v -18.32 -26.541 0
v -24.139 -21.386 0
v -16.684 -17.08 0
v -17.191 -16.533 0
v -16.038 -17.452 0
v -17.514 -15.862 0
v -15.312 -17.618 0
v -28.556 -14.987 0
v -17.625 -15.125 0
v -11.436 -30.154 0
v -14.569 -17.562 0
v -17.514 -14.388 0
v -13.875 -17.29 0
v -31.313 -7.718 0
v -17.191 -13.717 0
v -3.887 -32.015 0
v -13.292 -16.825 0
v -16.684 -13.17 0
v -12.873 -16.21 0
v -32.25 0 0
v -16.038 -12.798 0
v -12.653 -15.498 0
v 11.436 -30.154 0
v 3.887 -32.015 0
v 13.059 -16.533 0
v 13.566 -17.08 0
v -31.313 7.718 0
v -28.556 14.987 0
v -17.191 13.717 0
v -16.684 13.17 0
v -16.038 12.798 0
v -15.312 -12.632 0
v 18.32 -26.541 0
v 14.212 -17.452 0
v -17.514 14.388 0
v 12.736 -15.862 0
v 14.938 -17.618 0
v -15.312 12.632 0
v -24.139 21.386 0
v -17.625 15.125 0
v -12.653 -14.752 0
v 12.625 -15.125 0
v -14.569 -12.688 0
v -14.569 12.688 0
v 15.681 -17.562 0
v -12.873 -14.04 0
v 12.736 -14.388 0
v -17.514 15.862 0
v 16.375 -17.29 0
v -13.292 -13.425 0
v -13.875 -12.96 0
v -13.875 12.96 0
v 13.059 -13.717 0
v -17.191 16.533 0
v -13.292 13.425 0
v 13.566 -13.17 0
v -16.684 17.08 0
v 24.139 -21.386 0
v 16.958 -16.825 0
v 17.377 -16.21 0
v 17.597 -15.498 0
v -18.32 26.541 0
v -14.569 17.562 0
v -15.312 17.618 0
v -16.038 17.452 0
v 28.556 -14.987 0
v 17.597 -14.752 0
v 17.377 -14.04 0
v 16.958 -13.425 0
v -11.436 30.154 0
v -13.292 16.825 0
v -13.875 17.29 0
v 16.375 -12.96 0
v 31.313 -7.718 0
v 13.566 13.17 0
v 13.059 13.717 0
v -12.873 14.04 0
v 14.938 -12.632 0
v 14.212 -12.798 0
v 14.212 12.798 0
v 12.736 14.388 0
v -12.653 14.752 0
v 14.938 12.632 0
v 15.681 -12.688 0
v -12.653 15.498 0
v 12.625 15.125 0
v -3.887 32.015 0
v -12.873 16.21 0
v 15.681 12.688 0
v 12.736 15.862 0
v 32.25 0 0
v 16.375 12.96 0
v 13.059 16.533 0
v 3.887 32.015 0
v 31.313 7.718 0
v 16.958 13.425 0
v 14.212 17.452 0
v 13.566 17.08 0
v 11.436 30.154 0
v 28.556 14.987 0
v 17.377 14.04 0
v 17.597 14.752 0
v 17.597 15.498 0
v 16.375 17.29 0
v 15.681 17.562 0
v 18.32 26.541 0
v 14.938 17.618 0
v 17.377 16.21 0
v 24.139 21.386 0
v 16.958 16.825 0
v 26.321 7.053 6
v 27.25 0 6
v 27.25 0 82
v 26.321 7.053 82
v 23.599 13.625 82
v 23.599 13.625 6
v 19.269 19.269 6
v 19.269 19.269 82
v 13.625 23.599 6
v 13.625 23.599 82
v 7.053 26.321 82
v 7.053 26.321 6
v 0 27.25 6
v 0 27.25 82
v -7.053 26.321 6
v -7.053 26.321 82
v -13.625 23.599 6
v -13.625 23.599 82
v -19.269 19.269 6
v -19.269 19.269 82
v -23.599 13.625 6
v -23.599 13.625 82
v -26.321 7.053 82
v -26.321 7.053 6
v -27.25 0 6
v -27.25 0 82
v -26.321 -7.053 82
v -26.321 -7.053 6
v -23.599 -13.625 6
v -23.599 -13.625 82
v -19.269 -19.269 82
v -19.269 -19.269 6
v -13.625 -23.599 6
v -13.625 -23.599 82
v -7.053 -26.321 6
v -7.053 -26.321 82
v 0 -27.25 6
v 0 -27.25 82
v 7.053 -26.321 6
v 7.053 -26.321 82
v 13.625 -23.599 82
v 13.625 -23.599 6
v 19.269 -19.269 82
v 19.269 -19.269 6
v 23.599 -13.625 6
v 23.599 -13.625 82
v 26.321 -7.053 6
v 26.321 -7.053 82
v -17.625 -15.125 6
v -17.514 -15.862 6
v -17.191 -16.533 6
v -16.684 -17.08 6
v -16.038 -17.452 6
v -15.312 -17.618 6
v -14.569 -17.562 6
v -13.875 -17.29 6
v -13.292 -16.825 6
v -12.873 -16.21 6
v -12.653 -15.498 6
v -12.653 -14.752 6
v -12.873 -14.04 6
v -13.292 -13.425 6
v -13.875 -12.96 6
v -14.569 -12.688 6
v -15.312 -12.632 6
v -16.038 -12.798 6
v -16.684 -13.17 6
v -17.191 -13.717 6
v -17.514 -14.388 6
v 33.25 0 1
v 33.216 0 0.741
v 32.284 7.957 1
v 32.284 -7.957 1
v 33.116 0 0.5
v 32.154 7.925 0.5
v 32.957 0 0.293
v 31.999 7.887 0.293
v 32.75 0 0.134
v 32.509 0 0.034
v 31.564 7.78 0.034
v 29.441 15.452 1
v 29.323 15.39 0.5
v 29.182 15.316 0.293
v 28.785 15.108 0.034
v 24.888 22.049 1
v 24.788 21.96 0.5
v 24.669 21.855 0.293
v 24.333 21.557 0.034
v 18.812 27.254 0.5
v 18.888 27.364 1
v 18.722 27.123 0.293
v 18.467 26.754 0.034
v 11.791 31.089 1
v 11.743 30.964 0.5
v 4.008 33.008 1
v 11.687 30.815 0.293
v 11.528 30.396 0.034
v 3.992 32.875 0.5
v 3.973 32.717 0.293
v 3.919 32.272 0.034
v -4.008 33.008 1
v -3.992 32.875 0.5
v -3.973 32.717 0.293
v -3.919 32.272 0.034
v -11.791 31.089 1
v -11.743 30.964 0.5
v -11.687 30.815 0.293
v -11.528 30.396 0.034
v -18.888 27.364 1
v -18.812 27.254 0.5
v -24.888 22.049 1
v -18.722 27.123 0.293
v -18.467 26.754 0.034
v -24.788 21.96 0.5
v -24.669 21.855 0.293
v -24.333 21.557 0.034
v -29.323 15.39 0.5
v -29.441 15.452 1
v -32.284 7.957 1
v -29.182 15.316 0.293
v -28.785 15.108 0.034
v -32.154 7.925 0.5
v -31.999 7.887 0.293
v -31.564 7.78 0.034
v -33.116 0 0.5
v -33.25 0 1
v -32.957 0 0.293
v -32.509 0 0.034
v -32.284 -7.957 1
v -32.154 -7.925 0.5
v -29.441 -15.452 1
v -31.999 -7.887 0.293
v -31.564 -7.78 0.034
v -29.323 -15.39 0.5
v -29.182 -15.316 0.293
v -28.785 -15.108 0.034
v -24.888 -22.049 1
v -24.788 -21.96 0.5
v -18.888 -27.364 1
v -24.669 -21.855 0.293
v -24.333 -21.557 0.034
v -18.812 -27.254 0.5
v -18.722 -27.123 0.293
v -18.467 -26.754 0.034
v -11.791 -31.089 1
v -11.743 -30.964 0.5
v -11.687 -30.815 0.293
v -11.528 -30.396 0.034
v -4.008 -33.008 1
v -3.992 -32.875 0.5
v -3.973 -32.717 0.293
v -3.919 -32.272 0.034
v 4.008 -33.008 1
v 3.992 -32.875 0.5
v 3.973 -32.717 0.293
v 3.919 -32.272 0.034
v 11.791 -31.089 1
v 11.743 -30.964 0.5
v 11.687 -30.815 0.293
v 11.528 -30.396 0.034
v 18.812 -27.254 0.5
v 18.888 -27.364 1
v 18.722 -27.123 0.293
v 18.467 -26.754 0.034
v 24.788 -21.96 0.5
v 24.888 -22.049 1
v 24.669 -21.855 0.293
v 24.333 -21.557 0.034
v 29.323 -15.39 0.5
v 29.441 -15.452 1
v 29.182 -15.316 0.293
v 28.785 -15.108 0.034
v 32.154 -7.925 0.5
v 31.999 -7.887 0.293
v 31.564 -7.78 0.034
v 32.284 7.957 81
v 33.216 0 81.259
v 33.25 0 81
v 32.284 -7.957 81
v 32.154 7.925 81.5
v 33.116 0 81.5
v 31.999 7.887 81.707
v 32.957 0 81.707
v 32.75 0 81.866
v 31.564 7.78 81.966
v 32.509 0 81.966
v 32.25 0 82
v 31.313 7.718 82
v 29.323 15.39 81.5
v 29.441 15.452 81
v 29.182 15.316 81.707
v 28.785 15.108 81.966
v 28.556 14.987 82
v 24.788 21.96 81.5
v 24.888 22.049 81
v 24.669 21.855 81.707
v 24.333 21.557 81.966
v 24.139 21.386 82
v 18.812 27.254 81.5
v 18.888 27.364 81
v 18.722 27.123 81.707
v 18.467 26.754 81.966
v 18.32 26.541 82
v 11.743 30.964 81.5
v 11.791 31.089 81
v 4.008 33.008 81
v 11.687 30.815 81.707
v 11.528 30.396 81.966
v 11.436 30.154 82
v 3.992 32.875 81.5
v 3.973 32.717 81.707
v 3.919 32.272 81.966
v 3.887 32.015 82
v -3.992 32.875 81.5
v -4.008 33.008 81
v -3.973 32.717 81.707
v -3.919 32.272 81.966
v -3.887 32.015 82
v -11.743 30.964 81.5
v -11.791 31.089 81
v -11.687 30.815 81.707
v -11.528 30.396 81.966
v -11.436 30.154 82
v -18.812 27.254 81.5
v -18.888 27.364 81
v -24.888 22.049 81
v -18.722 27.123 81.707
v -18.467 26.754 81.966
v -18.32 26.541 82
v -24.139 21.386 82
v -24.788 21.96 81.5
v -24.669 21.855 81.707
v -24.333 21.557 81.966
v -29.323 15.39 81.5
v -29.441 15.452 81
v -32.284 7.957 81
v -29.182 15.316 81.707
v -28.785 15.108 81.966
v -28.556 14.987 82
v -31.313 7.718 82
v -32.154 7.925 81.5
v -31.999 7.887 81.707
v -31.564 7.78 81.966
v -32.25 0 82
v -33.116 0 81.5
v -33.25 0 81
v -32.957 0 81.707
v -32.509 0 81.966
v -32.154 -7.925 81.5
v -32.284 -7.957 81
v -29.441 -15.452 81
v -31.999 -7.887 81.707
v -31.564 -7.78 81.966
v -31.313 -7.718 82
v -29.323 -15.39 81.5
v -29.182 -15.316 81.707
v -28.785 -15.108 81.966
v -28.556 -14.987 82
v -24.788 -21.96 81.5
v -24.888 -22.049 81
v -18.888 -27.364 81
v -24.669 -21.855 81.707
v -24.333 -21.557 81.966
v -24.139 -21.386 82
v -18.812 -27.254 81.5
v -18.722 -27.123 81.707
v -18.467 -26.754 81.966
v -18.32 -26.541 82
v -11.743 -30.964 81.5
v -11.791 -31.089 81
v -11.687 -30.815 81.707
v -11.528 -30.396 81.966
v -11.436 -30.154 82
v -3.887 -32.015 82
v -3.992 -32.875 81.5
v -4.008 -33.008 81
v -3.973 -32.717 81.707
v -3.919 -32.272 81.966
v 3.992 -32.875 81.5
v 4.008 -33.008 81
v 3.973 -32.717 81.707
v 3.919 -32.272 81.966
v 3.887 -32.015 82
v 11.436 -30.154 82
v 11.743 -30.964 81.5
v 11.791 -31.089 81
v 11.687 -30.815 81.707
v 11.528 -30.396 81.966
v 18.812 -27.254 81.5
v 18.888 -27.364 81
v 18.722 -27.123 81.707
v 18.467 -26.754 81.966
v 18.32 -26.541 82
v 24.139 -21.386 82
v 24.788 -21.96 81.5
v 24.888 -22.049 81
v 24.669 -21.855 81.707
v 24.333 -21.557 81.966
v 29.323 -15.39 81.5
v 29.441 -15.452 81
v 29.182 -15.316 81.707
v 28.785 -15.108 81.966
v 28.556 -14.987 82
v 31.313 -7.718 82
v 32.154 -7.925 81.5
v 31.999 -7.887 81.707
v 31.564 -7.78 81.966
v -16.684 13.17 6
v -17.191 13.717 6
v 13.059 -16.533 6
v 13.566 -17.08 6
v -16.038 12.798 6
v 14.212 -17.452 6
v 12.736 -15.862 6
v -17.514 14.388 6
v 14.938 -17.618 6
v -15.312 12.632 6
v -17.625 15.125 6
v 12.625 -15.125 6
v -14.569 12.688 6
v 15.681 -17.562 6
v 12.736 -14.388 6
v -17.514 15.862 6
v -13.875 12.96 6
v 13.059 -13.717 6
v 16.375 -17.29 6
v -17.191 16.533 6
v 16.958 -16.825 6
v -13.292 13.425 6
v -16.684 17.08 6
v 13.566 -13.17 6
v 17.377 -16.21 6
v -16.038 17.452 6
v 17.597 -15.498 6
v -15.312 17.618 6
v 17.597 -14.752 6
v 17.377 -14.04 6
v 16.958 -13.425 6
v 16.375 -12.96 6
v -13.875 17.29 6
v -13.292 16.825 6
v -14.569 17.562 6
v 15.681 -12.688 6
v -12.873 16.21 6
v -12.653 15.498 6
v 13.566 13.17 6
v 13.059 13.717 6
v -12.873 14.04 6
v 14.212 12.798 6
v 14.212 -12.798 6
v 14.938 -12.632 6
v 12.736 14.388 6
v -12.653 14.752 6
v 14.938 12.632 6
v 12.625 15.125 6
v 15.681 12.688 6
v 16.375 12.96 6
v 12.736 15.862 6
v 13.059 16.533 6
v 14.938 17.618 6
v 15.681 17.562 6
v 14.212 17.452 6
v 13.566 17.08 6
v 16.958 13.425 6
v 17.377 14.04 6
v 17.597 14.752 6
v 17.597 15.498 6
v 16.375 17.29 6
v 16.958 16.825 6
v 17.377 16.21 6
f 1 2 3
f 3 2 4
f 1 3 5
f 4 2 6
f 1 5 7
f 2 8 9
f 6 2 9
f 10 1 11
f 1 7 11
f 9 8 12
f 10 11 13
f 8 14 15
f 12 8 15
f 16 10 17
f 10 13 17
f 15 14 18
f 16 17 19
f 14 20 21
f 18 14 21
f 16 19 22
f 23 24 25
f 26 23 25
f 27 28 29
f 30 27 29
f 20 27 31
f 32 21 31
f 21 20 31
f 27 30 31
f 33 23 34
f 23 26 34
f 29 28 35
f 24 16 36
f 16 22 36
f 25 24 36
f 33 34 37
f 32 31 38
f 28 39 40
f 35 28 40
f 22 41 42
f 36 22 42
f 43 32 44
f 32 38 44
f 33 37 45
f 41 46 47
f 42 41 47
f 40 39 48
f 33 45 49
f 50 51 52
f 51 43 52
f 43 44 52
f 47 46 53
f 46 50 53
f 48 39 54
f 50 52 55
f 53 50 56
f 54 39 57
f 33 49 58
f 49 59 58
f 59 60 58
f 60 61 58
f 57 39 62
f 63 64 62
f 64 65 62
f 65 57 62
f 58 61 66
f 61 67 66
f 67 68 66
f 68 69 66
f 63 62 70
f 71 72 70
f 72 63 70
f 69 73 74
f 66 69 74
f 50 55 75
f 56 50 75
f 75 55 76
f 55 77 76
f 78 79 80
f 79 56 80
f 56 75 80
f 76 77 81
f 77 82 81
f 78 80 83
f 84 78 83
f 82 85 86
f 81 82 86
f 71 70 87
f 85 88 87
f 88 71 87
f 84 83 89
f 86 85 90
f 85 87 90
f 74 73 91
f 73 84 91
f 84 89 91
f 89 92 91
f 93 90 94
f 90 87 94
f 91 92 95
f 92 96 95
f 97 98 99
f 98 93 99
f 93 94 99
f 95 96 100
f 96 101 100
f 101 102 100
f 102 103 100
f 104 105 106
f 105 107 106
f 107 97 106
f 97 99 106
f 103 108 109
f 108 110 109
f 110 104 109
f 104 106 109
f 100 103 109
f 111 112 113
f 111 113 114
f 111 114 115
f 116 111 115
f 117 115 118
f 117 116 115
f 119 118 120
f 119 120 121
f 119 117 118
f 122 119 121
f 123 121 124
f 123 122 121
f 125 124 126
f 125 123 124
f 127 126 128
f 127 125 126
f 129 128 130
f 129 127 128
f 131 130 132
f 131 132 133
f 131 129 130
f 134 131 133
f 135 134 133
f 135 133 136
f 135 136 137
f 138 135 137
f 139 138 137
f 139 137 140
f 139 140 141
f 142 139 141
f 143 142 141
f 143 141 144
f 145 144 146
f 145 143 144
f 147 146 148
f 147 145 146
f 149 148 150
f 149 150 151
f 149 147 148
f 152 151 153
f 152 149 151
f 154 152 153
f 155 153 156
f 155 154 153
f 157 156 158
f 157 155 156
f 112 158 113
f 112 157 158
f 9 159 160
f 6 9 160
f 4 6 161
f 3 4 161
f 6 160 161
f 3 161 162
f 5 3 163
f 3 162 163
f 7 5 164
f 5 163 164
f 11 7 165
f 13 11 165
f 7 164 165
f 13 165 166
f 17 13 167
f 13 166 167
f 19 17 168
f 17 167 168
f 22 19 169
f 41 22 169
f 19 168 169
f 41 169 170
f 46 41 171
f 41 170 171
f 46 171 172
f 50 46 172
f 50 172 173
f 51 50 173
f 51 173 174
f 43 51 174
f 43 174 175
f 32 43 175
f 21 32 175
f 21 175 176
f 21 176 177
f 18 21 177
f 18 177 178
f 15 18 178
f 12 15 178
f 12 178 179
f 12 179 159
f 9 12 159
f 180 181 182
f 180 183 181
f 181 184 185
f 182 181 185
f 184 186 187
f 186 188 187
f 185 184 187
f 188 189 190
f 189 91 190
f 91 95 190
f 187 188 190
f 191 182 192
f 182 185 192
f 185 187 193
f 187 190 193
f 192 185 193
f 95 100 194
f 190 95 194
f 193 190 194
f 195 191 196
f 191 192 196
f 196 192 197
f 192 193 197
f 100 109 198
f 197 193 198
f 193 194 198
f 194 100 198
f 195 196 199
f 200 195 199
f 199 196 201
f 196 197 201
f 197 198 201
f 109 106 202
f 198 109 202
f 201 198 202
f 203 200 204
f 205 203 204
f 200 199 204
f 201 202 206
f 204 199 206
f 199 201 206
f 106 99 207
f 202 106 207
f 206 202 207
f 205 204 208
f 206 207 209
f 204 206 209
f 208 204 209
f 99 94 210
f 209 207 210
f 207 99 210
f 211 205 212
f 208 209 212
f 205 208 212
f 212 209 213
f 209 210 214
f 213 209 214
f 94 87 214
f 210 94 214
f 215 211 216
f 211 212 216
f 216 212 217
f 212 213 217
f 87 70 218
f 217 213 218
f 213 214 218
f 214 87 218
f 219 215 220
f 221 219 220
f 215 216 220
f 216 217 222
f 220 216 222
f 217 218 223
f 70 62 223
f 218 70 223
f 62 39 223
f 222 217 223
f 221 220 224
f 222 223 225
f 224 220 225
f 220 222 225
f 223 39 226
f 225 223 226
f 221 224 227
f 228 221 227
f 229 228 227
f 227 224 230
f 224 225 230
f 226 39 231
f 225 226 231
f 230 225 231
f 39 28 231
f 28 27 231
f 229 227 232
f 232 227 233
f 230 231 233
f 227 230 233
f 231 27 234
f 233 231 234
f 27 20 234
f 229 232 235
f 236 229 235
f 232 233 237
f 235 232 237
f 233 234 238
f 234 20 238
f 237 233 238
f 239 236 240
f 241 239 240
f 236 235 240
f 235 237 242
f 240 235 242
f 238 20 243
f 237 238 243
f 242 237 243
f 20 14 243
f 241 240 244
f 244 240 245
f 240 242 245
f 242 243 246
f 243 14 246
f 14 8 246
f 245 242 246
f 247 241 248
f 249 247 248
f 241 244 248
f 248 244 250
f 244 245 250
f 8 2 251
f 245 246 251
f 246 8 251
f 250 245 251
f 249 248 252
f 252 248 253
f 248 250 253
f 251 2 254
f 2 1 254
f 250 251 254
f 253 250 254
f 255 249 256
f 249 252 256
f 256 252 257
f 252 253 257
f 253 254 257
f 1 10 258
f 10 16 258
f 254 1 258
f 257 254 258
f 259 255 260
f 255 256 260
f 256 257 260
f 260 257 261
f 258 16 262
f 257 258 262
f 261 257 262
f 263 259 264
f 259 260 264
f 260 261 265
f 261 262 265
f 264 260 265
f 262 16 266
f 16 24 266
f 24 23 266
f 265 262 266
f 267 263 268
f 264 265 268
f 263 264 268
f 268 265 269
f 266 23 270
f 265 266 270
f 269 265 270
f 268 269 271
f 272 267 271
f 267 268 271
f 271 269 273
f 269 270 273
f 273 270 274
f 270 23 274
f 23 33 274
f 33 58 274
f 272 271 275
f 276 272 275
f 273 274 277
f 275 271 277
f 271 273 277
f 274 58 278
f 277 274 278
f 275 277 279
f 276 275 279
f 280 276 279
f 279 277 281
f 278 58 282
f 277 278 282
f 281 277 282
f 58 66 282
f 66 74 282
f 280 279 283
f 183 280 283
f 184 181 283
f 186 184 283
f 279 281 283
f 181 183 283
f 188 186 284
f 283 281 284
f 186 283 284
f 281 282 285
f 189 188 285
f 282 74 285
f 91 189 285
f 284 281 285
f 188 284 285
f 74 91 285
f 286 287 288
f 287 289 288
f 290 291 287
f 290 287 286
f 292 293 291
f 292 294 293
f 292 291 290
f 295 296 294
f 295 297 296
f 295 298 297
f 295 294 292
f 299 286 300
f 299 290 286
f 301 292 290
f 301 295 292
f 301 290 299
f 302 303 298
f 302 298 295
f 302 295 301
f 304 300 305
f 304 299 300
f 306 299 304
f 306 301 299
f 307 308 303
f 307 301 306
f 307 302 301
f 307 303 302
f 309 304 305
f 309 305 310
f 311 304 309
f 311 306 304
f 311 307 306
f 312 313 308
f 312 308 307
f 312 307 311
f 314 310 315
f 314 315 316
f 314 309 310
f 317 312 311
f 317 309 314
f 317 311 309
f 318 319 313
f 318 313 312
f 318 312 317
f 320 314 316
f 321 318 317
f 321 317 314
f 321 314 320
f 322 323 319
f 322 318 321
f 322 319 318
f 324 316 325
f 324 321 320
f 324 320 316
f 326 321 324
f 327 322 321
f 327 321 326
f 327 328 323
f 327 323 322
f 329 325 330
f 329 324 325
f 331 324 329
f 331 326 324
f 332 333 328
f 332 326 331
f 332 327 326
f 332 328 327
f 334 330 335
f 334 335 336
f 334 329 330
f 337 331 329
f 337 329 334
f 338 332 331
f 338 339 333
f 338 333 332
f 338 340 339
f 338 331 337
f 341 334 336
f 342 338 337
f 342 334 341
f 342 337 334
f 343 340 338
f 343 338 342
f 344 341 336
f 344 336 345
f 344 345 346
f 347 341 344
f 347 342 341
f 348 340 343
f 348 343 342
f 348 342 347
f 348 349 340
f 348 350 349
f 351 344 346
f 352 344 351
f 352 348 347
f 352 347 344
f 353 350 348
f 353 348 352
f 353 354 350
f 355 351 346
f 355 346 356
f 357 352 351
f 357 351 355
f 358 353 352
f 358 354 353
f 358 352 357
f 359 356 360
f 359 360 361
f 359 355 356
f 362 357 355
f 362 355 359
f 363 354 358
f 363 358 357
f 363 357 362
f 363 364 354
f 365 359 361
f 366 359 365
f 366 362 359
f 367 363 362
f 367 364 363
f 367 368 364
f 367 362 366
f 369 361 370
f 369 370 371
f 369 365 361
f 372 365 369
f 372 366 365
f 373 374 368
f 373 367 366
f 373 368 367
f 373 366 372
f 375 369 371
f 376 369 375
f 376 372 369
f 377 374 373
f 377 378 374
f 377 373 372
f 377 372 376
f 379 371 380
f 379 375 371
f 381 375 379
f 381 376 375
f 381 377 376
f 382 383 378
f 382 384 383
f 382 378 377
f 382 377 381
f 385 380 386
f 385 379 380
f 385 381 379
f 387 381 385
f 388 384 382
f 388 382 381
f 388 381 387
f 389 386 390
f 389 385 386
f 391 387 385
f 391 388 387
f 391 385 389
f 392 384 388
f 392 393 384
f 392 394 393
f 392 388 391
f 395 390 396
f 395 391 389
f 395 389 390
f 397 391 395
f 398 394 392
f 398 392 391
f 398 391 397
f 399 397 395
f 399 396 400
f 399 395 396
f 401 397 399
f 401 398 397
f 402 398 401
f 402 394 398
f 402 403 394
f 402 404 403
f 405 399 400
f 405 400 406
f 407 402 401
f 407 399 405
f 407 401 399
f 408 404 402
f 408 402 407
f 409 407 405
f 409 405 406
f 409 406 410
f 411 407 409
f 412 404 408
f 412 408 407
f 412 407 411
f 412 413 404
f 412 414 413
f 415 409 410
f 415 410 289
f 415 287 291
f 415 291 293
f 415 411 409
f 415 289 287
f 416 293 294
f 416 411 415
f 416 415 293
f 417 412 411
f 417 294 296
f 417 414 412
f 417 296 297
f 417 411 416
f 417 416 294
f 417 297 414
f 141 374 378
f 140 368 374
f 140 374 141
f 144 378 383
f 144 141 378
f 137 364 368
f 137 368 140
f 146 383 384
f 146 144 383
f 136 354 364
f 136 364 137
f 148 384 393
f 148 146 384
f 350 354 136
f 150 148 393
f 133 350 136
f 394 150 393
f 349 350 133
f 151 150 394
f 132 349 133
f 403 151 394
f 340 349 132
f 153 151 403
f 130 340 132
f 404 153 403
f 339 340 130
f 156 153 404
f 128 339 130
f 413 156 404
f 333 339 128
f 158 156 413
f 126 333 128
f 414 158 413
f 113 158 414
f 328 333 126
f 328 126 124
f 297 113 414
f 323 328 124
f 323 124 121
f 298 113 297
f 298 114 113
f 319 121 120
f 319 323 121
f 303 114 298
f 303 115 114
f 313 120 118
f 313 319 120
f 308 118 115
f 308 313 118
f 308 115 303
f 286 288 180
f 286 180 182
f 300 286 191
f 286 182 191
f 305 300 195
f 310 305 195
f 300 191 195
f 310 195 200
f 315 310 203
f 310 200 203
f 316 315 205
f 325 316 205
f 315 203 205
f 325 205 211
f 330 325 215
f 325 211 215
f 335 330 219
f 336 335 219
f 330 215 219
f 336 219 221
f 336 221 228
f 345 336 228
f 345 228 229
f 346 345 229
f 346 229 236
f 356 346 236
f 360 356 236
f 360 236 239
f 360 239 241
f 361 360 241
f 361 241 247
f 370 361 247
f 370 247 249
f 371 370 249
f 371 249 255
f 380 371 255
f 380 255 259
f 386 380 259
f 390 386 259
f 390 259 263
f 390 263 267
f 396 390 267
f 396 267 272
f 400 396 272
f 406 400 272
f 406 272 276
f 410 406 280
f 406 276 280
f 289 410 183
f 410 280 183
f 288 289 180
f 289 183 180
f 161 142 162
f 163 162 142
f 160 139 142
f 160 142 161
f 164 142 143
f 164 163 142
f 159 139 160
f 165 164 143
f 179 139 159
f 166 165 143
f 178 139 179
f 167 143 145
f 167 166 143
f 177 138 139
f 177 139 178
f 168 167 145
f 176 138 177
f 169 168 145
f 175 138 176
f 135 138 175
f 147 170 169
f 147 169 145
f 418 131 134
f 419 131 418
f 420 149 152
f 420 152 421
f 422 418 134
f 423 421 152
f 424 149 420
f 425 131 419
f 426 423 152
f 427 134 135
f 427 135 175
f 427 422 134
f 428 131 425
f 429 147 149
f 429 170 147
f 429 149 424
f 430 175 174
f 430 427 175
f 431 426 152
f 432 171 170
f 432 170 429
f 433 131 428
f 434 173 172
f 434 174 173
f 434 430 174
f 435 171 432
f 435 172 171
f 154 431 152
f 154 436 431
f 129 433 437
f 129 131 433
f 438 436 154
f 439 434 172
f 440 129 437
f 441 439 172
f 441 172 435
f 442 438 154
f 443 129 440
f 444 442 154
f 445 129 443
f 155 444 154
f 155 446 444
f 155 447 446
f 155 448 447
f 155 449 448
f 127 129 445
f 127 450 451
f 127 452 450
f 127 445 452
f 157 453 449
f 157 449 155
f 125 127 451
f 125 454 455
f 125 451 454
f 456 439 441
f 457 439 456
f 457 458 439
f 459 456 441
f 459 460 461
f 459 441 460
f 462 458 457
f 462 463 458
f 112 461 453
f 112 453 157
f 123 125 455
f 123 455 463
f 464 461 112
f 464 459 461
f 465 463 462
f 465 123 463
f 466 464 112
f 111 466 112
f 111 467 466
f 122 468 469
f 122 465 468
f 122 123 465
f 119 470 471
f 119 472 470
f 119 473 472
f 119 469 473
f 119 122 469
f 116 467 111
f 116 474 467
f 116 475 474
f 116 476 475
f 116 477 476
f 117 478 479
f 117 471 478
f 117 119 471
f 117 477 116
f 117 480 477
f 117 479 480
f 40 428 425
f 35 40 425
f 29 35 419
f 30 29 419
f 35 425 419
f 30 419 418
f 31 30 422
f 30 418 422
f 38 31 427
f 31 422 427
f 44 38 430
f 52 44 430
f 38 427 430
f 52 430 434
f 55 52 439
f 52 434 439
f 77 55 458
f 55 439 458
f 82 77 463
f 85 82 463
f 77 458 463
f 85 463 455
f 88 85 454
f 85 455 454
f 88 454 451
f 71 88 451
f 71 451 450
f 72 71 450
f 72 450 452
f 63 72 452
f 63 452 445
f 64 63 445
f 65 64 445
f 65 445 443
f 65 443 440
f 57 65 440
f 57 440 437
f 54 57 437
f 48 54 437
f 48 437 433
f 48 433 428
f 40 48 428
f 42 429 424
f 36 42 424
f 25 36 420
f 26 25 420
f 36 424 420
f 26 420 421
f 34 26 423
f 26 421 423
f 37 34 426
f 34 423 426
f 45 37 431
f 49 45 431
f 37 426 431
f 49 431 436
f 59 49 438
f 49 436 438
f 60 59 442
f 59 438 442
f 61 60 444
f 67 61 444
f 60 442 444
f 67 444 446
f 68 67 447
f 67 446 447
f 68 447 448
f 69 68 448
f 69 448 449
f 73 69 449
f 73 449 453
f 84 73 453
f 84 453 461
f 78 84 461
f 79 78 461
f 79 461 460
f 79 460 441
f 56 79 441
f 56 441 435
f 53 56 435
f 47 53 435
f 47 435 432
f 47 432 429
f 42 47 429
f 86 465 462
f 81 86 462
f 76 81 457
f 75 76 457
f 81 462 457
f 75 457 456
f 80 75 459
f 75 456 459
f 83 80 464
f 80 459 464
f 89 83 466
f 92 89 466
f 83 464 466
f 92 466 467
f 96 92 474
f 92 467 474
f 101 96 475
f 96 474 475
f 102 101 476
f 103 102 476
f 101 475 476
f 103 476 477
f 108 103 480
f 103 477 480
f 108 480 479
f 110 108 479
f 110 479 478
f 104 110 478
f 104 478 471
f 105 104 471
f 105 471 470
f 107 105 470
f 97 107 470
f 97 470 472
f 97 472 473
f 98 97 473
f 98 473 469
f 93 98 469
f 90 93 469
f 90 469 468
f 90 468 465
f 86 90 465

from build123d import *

# Parameters (mm, degrees)
F3_R     = 33.25
F4_DEPTH = 6
F5_R     = 33.25
F5_R_2   = 27.25
F6_DEPTH = 76
F7_D     = 5
F8_R     = 1


with BuildPart() as f4:
    # F3 (on Top) → F4 (new body)
    with BuildSketch(Plane.XY):
        Circle(F3_R)
    extrude(amount=F4_DEPTH)

    # F5 (on face) → F6 (join)
    with BuildSketch(Plane.XY.offset(6)):
        Circle(F5_R)
        Circle(F5_R_2, mode=Mode.SUBTRACT)
    extrude(amount=F6_DEPTH)

    # F7 (through all)
    with Locations(Plane(origin=(0, 0, 0), x_dir=(1, 0, 0), z_dir=(0, 0, -1))):
        with Locations((-15.125, -15.125), (15.125, -15.125), (15.125, 15.125), (-15.125, 15.125)):
            Hole(F7_D / 2)

    # F8
    f8_edges = [f4.edges().sort_by_distance(p)[0] for p in [
        (-33.25, 0, 0),
        (-33.25, 0, 82),
    ]]
    fillet(f8_edges, radius=F8_R)


solid = f4.part
